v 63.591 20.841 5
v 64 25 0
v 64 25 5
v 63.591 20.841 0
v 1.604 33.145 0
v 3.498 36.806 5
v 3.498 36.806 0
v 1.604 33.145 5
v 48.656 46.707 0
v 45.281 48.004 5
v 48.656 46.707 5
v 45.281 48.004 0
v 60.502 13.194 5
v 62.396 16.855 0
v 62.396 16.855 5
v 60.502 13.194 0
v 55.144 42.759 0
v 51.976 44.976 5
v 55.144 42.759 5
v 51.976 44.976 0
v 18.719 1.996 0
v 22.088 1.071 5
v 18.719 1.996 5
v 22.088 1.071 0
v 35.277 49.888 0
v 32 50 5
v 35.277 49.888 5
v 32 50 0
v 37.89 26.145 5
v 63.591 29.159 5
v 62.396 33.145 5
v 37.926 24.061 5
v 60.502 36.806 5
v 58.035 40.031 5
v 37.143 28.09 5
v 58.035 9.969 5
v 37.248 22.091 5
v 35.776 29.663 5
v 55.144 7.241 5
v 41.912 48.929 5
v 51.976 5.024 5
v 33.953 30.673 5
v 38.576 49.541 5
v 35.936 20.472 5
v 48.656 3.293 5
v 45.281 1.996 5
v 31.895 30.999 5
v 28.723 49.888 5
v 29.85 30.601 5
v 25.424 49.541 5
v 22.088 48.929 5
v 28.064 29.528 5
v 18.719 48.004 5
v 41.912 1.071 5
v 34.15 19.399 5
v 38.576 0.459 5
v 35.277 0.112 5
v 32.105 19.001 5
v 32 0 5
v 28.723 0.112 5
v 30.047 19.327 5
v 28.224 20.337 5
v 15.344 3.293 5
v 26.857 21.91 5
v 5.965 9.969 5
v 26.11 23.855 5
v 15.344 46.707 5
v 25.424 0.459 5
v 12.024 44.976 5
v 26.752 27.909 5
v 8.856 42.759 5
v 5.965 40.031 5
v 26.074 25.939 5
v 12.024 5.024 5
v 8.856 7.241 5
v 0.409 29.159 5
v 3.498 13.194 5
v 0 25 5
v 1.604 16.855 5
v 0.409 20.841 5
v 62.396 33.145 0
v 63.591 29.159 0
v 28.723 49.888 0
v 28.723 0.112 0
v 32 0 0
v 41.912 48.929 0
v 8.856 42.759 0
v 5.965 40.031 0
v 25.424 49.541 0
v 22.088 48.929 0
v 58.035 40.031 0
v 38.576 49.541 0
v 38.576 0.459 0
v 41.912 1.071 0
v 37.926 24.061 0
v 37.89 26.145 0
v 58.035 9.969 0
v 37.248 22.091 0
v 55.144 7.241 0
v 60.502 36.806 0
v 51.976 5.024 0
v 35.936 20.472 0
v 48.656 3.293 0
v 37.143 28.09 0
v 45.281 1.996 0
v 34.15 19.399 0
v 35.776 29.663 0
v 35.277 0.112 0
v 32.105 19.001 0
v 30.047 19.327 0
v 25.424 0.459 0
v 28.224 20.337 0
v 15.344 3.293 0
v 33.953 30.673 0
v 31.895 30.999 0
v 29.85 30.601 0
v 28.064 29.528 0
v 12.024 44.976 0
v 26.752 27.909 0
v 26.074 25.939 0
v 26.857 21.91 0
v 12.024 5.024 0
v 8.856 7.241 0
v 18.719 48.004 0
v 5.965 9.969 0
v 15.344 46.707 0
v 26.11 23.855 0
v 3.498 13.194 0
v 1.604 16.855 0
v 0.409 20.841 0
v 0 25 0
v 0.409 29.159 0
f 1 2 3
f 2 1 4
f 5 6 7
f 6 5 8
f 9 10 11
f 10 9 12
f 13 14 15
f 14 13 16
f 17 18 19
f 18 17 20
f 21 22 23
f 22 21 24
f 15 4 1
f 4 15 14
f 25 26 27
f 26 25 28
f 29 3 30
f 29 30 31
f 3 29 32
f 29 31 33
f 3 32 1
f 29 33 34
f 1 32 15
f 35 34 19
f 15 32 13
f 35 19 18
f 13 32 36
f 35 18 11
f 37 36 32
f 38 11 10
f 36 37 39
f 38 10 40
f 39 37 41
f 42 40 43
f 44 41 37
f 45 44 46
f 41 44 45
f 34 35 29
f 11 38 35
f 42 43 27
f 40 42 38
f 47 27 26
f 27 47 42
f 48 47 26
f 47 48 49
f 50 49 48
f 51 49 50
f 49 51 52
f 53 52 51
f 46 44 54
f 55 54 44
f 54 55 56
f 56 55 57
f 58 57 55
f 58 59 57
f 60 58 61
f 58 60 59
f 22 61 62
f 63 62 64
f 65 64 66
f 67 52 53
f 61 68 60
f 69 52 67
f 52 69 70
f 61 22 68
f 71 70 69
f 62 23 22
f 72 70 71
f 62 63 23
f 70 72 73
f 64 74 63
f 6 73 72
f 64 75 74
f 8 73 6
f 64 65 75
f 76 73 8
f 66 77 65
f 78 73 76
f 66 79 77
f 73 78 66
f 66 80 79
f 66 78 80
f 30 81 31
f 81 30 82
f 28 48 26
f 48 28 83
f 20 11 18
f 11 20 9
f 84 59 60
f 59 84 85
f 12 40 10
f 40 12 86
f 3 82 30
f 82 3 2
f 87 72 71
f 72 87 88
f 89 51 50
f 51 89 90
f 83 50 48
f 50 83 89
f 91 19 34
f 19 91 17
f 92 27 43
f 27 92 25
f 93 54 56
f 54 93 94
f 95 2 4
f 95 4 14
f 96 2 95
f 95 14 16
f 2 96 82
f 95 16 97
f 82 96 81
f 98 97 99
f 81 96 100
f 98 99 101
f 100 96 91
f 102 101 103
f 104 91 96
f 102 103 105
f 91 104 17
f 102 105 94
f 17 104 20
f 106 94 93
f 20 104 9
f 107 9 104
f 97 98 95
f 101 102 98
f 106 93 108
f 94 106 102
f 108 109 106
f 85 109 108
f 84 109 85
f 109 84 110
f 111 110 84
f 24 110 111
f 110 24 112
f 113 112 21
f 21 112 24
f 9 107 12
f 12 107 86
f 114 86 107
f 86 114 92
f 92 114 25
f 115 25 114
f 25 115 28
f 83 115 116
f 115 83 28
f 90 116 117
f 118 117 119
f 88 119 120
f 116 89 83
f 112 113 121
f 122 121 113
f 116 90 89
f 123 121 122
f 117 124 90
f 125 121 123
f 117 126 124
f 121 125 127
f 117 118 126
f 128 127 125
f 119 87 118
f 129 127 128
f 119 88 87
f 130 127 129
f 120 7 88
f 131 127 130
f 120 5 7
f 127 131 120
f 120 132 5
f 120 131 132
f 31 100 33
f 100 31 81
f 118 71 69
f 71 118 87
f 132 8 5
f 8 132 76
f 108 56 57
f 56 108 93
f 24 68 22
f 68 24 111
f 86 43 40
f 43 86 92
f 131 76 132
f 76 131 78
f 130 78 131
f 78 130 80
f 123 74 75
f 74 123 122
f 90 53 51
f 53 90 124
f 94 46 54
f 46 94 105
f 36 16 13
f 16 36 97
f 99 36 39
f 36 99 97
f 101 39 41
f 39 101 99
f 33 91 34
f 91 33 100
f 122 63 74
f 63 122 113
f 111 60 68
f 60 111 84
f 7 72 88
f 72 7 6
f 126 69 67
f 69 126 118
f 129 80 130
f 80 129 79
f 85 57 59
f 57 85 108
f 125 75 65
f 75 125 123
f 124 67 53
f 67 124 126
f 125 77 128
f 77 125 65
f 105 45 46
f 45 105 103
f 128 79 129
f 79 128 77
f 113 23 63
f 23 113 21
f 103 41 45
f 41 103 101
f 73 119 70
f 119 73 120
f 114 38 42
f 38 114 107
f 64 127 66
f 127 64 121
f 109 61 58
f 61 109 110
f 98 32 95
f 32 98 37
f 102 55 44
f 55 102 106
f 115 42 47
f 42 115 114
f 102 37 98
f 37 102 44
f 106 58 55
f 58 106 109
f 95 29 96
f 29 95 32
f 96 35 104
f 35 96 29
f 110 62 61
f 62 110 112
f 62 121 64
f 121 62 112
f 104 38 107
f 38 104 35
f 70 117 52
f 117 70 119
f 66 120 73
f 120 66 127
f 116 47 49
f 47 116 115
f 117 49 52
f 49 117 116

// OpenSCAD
$fn = 32;

// ----------------------------------------------------------------------
// Cam plate: double_lobe cam, base R24
// ----------------------------------------------------------------------

// --- parameters (mm) ---
base_r = 24;              // base circle radius
lobe_h = 8;               // cam lobe rise
bore_r = 6;               // shaft bore radius
plate_t = 5;              // plate thickness, Z (extrusion height)

profile = [[64, 25], [63.591, 29.159], [62.396, 33.145], [60.502, 36.806], [58.035, 40.031], [55.144, 42.759], [51.976, 44.976], [48.656, 46.707], [45.281, 48.004], [41.912, 48.929], [38.576, 49.541], [35.277, 49.888], [32, 50], [28.723, 49.888], [25.424, 49.541], [22.088, 48.929], [18.719, 48.004], [15.344, 46.707], [12.024, 44.976], [8.856, 42.759], [5.965, 40.031], [3.498, 36.806], [1.604, 33.145], [0.409, 29.159], [0, 25], [0.409, 20.841], [1.604, 16.855], [3.498, 13.194], [5.965, 9.969], [8.856, 7.241], [12.024, 5.024], [15.344, 3.293], [18.719, 1.996], [22.088, 1.071], [25.424, 0.459], [28.723, 0.112], [32, 0], [35.277, 0.112], [38.576, 0.459], [41.912, 1.071], [45.281, 1.996], [48.656, 3.293], [51.976, 5.024], [55.144, 7.241], [58.035, 9.969], [60.502, 13.194], [62.396, 16.855], [63.591, 20.841]];  // primary outline, 48 points, counter clockwise
void_1 = [[37.89, 26.145], [37.143, 28.09], [35.776, 29.663], [33.953, 30.673], [31.895, 30.999], [29.85, 30.601], [28.064, 29.528], [26.752, 27.909], [26.074, 25.939], [26.11, 23.855], [26.857, 21.91], [28.224, 20.337], [30.047, 19.327], [32.105, 19.001], [34.15, 19.399], [35.936, 20.472], [37.248, 22.091], [37.926, 24.061]];  // shaft bore, 18 points

// --- the one profile operation ---
difference() {
  linear_extrude(height = plate_t) polygon(points = profile);
  translate([0, 0, -1])
    linear_extrude(height = plate_t + 2) polygon(points = void_1);
}
